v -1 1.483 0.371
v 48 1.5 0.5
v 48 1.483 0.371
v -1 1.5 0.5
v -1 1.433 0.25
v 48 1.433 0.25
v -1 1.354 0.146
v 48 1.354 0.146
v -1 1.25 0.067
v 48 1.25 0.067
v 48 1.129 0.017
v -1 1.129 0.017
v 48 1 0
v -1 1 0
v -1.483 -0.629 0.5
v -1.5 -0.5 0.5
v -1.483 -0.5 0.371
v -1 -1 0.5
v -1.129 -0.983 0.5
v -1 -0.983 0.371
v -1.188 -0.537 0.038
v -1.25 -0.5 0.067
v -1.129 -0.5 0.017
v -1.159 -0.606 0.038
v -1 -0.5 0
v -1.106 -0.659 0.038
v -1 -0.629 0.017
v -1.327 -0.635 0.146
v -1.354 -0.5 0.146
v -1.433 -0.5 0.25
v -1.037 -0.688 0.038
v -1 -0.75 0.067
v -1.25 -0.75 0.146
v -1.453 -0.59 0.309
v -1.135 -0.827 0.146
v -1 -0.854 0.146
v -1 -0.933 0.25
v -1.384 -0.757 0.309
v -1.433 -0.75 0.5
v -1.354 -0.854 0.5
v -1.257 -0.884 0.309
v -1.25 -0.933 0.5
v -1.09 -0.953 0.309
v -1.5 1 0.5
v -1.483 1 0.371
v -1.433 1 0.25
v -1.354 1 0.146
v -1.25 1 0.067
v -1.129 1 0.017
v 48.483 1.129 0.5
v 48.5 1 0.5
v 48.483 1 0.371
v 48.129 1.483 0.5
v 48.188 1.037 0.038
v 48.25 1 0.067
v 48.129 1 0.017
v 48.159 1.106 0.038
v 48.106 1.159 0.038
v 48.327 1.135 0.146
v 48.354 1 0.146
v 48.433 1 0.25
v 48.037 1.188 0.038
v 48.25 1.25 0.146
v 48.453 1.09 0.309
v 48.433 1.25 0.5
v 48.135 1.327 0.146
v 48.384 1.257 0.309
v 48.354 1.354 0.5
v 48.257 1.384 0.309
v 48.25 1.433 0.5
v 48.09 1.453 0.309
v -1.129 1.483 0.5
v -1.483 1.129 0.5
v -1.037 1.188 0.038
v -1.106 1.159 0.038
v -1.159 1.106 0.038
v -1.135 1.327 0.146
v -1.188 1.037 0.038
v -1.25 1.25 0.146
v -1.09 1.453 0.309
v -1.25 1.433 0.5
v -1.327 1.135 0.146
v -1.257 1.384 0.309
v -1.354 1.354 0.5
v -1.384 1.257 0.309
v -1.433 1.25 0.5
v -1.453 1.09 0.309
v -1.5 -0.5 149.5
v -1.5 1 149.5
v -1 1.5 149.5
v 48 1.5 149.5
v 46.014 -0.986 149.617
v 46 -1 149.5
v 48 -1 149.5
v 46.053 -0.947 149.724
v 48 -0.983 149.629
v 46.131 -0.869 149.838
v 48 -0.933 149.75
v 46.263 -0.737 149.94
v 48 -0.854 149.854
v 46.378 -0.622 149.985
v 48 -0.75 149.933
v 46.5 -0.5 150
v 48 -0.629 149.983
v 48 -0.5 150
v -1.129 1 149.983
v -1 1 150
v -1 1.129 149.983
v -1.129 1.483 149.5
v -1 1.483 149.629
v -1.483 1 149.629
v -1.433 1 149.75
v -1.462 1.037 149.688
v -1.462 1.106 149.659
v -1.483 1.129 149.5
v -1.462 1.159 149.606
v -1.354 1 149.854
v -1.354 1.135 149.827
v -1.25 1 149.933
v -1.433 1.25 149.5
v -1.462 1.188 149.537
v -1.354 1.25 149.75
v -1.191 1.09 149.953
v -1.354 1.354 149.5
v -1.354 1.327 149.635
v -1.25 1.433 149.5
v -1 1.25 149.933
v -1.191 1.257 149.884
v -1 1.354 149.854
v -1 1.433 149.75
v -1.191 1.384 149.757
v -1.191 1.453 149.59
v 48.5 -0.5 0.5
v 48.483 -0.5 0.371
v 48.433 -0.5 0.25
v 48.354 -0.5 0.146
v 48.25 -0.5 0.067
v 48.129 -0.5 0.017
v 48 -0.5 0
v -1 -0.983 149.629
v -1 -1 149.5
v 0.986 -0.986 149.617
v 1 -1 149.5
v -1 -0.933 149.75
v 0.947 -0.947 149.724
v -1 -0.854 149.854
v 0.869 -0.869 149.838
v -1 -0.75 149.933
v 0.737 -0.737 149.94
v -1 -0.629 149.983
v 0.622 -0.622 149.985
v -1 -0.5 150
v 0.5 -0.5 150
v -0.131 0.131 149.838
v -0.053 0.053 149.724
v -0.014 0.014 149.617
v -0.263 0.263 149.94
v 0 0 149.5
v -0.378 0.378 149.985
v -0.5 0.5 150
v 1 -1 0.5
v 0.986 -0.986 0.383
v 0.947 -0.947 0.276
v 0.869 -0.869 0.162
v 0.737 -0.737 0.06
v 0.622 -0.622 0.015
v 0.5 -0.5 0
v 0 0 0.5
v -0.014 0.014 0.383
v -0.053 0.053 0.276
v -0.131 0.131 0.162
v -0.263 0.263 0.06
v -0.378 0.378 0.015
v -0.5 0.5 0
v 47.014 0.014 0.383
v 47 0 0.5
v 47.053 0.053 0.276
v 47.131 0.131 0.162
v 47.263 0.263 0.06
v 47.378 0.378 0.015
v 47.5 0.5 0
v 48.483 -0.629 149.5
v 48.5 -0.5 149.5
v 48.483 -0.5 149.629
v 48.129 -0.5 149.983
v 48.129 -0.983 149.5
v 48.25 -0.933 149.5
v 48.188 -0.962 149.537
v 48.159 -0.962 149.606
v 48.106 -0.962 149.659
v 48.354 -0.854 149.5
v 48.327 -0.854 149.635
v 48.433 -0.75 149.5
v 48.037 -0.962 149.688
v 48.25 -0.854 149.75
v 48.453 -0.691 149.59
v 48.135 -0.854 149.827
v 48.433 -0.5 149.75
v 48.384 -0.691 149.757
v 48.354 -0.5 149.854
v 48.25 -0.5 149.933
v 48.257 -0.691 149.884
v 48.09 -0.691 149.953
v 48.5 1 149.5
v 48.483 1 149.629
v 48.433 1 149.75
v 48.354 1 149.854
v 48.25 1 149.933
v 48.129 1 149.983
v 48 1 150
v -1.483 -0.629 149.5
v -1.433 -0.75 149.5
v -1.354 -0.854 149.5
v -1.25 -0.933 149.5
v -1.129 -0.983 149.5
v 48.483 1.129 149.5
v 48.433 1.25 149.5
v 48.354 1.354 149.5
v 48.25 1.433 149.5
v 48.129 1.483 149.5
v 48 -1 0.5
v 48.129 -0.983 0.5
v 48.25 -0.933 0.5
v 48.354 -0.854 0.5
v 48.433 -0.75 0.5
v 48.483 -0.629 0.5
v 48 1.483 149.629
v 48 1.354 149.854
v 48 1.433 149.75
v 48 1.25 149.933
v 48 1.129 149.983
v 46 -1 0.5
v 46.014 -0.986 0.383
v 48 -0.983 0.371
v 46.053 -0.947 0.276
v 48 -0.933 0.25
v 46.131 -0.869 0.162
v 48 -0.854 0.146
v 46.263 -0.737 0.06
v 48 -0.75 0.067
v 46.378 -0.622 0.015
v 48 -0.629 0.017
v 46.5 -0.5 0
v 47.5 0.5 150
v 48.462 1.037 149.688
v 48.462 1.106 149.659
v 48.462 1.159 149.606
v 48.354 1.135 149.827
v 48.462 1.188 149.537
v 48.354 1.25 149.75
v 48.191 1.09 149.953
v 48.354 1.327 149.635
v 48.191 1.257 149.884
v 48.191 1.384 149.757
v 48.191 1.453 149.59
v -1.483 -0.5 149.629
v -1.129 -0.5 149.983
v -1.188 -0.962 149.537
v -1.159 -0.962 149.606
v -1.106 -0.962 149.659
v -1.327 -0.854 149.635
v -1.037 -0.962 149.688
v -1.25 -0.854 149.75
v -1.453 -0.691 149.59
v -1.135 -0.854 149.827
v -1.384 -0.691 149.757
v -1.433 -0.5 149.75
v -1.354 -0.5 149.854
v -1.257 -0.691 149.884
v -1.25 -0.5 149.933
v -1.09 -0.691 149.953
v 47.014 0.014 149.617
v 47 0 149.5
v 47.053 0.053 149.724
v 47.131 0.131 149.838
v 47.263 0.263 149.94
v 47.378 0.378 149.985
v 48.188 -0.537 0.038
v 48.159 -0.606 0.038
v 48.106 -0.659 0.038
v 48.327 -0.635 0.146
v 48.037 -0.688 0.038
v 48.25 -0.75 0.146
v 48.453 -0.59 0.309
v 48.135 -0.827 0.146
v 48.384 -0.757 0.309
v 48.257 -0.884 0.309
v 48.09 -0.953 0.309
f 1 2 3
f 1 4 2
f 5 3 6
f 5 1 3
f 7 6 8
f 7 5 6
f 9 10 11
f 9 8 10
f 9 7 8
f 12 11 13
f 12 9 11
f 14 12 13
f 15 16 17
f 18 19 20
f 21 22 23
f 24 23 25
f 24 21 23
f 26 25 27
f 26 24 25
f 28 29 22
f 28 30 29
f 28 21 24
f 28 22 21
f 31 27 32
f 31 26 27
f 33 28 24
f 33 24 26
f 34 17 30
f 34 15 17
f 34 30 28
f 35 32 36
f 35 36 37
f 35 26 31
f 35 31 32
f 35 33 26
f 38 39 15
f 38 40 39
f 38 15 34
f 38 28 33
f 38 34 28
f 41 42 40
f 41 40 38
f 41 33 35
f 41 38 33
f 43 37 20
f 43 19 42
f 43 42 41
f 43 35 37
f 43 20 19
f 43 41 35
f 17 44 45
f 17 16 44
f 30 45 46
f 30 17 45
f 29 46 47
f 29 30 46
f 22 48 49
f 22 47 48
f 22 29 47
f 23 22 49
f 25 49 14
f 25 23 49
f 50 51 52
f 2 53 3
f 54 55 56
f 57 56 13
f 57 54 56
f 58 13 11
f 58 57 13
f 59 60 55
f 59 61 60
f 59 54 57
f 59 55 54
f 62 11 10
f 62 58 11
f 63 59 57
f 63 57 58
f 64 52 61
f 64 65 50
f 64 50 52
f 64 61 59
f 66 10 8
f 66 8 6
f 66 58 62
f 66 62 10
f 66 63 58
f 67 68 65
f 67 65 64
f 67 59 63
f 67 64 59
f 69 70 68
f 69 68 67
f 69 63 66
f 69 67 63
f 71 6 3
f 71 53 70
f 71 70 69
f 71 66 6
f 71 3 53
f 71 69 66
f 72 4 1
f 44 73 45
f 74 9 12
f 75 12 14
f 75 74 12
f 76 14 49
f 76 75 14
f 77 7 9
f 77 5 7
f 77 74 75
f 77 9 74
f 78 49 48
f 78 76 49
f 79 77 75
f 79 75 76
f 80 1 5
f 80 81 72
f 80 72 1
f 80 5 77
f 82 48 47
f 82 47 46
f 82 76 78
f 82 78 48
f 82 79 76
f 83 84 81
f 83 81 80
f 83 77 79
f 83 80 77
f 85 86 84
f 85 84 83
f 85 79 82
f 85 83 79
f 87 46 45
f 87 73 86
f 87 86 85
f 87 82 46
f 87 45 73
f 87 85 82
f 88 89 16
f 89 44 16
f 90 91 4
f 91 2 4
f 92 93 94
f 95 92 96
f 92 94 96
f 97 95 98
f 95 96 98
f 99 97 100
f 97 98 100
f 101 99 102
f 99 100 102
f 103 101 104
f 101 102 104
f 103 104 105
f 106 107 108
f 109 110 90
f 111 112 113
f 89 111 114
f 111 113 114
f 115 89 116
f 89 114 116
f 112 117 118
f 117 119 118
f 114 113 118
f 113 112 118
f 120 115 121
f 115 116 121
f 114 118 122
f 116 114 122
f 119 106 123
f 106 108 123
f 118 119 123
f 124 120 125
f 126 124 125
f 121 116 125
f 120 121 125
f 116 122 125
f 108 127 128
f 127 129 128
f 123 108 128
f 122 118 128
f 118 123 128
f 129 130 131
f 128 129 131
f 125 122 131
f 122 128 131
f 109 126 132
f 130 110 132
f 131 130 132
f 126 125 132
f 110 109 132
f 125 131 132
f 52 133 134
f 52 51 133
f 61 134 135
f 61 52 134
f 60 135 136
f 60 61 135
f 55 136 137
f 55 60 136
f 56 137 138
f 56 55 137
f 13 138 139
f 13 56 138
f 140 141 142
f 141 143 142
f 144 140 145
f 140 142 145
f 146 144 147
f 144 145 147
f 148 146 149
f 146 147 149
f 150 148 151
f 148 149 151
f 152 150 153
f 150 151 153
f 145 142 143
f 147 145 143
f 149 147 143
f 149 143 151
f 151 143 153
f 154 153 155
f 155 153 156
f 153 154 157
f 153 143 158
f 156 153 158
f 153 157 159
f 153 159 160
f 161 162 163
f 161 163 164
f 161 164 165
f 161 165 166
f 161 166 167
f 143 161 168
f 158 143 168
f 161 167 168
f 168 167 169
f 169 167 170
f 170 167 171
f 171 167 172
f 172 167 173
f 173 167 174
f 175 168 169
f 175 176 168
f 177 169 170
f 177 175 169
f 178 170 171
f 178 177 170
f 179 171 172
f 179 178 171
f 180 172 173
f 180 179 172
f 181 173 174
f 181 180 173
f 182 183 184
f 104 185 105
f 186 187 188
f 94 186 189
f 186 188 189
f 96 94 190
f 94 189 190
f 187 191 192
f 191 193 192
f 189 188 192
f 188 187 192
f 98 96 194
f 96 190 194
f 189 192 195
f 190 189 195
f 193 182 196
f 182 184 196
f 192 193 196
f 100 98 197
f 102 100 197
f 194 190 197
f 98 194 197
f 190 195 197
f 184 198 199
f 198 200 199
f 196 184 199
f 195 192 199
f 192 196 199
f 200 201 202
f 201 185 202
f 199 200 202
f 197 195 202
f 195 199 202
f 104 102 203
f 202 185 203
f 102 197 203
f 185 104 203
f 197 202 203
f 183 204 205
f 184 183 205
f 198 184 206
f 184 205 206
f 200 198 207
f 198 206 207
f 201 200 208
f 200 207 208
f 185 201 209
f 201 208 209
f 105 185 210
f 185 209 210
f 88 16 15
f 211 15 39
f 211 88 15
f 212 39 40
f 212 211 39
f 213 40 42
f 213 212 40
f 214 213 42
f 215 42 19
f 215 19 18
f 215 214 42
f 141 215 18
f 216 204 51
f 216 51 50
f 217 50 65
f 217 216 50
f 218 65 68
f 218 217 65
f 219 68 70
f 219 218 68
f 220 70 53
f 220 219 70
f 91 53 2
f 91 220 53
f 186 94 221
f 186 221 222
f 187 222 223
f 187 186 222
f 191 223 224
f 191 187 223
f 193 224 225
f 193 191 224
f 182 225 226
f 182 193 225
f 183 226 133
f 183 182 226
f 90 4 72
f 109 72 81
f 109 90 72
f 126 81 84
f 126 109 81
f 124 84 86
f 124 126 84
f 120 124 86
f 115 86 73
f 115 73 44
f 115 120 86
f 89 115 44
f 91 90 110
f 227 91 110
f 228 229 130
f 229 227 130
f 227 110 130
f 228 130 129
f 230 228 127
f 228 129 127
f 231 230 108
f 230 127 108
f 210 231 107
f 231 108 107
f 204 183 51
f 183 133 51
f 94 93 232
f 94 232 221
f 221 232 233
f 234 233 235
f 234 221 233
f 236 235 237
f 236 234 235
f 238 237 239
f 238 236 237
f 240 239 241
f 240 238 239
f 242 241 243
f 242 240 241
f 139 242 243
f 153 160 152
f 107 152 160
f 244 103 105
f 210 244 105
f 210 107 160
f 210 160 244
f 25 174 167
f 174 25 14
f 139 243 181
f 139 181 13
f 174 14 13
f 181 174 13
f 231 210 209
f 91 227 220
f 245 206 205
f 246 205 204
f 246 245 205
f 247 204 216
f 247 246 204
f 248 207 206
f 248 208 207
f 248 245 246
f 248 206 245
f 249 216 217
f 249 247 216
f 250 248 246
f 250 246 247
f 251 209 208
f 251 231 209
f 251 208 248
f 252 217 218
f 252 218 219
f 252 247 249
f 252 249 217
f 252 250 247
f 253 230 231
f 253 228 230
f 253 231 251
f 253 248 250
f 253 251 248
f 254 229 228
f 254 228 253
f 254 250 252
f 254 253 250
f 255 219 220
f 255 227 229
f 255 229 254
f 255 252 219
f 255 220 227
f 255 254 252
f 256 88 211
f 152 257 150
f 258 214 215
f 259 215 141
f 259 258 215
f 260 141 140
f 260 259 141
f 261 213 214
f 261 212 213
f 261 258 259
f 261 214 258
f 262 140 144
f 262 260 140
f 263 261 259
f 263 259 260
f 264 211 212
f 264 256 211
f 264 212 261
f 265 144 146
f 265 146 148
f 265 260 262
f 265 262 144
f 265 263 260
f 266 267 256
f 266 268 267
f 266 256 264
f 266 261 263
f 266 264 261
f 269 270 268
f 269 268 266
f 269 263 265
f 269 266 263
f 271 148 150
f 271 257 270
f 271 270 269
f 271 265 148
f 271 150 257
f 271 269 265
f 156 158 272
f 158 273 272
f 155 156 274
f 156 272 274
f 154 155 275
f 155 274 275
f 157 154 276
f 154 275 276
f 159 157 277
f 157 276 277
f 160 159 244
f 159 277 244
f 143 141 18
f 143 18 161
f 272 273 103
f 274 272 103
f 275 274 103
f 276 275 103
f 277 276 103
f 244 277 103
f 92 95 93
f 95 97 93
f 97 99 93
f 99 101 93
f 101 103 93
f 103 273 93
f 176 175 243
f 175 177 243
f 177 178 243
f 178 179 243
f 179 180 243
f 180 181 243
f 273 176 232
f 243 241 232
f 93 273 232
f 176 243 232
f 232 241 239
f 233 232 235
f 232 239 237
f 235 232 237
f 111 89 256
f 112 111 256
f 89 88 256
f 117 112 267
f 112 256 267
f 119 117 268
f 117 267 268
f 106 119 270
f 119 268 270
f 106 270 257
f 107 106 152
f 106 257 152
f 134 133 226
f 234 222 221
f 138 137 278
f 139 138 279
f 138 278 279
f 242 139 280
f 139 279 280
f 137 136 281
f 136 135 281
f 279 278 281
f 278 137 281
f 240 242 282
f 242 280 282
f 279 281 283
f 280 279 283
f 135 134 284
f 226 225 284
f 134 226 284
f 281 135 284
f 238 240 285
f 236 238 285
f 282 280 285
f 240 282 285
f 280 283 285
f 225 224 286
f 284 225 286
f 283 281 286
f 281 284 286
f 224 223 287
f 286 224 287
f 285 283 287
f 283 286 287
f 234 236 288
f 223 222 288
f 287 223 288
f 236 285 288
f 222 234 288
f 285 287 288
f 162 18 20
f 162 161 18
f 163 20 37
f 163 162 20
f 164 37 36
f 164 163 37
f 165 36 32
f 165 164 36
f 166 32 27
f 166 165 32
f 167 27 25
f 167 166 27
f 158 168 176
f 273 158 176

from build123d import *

# Parameters (mm, degrees)
F1_DEPTH = 150
F2_R     = 0.5


with BuildPart() as f1:
    # F0 (on Top) → F1 (new body)
    with BuildSketch(Plane.XY):
        Polygon((1, -1), (0, 0), (47, 0), (46, -1), (48.5, -1), (48.5, 1.5), (-1.5, 1.5), (-1.5, -1), align=None)
    extrude(amount=F1_DEPTH)

    # F2
    f2_edges = [f1.edges().sort_by_distance(p)[0] for p in [
        (23.5, 0, 150),
        (23.5, 1.5, 150),
        (-1.5, 0.25, 150),
        (48.5, 0.25, 150),
        (48.5, -1, 75),
        (48.5, 1.5, 75),
        (48.5, 0.25, 0),
        (-1.5, -1, 75),
        (-1.5, 1.5, 75),
        (23.5, 1.5, 0),
        (-1.5, 0.25, 0),
        (47.25, -1, 0),
        (-0.25, -1, 0),
        (23.5, 0, 0),
        (-0.25, -1, 150),
        (47.25, -1, 150),
    ]]
    fillet(f2_edges, radius=F2_R)


solid = f1.part
